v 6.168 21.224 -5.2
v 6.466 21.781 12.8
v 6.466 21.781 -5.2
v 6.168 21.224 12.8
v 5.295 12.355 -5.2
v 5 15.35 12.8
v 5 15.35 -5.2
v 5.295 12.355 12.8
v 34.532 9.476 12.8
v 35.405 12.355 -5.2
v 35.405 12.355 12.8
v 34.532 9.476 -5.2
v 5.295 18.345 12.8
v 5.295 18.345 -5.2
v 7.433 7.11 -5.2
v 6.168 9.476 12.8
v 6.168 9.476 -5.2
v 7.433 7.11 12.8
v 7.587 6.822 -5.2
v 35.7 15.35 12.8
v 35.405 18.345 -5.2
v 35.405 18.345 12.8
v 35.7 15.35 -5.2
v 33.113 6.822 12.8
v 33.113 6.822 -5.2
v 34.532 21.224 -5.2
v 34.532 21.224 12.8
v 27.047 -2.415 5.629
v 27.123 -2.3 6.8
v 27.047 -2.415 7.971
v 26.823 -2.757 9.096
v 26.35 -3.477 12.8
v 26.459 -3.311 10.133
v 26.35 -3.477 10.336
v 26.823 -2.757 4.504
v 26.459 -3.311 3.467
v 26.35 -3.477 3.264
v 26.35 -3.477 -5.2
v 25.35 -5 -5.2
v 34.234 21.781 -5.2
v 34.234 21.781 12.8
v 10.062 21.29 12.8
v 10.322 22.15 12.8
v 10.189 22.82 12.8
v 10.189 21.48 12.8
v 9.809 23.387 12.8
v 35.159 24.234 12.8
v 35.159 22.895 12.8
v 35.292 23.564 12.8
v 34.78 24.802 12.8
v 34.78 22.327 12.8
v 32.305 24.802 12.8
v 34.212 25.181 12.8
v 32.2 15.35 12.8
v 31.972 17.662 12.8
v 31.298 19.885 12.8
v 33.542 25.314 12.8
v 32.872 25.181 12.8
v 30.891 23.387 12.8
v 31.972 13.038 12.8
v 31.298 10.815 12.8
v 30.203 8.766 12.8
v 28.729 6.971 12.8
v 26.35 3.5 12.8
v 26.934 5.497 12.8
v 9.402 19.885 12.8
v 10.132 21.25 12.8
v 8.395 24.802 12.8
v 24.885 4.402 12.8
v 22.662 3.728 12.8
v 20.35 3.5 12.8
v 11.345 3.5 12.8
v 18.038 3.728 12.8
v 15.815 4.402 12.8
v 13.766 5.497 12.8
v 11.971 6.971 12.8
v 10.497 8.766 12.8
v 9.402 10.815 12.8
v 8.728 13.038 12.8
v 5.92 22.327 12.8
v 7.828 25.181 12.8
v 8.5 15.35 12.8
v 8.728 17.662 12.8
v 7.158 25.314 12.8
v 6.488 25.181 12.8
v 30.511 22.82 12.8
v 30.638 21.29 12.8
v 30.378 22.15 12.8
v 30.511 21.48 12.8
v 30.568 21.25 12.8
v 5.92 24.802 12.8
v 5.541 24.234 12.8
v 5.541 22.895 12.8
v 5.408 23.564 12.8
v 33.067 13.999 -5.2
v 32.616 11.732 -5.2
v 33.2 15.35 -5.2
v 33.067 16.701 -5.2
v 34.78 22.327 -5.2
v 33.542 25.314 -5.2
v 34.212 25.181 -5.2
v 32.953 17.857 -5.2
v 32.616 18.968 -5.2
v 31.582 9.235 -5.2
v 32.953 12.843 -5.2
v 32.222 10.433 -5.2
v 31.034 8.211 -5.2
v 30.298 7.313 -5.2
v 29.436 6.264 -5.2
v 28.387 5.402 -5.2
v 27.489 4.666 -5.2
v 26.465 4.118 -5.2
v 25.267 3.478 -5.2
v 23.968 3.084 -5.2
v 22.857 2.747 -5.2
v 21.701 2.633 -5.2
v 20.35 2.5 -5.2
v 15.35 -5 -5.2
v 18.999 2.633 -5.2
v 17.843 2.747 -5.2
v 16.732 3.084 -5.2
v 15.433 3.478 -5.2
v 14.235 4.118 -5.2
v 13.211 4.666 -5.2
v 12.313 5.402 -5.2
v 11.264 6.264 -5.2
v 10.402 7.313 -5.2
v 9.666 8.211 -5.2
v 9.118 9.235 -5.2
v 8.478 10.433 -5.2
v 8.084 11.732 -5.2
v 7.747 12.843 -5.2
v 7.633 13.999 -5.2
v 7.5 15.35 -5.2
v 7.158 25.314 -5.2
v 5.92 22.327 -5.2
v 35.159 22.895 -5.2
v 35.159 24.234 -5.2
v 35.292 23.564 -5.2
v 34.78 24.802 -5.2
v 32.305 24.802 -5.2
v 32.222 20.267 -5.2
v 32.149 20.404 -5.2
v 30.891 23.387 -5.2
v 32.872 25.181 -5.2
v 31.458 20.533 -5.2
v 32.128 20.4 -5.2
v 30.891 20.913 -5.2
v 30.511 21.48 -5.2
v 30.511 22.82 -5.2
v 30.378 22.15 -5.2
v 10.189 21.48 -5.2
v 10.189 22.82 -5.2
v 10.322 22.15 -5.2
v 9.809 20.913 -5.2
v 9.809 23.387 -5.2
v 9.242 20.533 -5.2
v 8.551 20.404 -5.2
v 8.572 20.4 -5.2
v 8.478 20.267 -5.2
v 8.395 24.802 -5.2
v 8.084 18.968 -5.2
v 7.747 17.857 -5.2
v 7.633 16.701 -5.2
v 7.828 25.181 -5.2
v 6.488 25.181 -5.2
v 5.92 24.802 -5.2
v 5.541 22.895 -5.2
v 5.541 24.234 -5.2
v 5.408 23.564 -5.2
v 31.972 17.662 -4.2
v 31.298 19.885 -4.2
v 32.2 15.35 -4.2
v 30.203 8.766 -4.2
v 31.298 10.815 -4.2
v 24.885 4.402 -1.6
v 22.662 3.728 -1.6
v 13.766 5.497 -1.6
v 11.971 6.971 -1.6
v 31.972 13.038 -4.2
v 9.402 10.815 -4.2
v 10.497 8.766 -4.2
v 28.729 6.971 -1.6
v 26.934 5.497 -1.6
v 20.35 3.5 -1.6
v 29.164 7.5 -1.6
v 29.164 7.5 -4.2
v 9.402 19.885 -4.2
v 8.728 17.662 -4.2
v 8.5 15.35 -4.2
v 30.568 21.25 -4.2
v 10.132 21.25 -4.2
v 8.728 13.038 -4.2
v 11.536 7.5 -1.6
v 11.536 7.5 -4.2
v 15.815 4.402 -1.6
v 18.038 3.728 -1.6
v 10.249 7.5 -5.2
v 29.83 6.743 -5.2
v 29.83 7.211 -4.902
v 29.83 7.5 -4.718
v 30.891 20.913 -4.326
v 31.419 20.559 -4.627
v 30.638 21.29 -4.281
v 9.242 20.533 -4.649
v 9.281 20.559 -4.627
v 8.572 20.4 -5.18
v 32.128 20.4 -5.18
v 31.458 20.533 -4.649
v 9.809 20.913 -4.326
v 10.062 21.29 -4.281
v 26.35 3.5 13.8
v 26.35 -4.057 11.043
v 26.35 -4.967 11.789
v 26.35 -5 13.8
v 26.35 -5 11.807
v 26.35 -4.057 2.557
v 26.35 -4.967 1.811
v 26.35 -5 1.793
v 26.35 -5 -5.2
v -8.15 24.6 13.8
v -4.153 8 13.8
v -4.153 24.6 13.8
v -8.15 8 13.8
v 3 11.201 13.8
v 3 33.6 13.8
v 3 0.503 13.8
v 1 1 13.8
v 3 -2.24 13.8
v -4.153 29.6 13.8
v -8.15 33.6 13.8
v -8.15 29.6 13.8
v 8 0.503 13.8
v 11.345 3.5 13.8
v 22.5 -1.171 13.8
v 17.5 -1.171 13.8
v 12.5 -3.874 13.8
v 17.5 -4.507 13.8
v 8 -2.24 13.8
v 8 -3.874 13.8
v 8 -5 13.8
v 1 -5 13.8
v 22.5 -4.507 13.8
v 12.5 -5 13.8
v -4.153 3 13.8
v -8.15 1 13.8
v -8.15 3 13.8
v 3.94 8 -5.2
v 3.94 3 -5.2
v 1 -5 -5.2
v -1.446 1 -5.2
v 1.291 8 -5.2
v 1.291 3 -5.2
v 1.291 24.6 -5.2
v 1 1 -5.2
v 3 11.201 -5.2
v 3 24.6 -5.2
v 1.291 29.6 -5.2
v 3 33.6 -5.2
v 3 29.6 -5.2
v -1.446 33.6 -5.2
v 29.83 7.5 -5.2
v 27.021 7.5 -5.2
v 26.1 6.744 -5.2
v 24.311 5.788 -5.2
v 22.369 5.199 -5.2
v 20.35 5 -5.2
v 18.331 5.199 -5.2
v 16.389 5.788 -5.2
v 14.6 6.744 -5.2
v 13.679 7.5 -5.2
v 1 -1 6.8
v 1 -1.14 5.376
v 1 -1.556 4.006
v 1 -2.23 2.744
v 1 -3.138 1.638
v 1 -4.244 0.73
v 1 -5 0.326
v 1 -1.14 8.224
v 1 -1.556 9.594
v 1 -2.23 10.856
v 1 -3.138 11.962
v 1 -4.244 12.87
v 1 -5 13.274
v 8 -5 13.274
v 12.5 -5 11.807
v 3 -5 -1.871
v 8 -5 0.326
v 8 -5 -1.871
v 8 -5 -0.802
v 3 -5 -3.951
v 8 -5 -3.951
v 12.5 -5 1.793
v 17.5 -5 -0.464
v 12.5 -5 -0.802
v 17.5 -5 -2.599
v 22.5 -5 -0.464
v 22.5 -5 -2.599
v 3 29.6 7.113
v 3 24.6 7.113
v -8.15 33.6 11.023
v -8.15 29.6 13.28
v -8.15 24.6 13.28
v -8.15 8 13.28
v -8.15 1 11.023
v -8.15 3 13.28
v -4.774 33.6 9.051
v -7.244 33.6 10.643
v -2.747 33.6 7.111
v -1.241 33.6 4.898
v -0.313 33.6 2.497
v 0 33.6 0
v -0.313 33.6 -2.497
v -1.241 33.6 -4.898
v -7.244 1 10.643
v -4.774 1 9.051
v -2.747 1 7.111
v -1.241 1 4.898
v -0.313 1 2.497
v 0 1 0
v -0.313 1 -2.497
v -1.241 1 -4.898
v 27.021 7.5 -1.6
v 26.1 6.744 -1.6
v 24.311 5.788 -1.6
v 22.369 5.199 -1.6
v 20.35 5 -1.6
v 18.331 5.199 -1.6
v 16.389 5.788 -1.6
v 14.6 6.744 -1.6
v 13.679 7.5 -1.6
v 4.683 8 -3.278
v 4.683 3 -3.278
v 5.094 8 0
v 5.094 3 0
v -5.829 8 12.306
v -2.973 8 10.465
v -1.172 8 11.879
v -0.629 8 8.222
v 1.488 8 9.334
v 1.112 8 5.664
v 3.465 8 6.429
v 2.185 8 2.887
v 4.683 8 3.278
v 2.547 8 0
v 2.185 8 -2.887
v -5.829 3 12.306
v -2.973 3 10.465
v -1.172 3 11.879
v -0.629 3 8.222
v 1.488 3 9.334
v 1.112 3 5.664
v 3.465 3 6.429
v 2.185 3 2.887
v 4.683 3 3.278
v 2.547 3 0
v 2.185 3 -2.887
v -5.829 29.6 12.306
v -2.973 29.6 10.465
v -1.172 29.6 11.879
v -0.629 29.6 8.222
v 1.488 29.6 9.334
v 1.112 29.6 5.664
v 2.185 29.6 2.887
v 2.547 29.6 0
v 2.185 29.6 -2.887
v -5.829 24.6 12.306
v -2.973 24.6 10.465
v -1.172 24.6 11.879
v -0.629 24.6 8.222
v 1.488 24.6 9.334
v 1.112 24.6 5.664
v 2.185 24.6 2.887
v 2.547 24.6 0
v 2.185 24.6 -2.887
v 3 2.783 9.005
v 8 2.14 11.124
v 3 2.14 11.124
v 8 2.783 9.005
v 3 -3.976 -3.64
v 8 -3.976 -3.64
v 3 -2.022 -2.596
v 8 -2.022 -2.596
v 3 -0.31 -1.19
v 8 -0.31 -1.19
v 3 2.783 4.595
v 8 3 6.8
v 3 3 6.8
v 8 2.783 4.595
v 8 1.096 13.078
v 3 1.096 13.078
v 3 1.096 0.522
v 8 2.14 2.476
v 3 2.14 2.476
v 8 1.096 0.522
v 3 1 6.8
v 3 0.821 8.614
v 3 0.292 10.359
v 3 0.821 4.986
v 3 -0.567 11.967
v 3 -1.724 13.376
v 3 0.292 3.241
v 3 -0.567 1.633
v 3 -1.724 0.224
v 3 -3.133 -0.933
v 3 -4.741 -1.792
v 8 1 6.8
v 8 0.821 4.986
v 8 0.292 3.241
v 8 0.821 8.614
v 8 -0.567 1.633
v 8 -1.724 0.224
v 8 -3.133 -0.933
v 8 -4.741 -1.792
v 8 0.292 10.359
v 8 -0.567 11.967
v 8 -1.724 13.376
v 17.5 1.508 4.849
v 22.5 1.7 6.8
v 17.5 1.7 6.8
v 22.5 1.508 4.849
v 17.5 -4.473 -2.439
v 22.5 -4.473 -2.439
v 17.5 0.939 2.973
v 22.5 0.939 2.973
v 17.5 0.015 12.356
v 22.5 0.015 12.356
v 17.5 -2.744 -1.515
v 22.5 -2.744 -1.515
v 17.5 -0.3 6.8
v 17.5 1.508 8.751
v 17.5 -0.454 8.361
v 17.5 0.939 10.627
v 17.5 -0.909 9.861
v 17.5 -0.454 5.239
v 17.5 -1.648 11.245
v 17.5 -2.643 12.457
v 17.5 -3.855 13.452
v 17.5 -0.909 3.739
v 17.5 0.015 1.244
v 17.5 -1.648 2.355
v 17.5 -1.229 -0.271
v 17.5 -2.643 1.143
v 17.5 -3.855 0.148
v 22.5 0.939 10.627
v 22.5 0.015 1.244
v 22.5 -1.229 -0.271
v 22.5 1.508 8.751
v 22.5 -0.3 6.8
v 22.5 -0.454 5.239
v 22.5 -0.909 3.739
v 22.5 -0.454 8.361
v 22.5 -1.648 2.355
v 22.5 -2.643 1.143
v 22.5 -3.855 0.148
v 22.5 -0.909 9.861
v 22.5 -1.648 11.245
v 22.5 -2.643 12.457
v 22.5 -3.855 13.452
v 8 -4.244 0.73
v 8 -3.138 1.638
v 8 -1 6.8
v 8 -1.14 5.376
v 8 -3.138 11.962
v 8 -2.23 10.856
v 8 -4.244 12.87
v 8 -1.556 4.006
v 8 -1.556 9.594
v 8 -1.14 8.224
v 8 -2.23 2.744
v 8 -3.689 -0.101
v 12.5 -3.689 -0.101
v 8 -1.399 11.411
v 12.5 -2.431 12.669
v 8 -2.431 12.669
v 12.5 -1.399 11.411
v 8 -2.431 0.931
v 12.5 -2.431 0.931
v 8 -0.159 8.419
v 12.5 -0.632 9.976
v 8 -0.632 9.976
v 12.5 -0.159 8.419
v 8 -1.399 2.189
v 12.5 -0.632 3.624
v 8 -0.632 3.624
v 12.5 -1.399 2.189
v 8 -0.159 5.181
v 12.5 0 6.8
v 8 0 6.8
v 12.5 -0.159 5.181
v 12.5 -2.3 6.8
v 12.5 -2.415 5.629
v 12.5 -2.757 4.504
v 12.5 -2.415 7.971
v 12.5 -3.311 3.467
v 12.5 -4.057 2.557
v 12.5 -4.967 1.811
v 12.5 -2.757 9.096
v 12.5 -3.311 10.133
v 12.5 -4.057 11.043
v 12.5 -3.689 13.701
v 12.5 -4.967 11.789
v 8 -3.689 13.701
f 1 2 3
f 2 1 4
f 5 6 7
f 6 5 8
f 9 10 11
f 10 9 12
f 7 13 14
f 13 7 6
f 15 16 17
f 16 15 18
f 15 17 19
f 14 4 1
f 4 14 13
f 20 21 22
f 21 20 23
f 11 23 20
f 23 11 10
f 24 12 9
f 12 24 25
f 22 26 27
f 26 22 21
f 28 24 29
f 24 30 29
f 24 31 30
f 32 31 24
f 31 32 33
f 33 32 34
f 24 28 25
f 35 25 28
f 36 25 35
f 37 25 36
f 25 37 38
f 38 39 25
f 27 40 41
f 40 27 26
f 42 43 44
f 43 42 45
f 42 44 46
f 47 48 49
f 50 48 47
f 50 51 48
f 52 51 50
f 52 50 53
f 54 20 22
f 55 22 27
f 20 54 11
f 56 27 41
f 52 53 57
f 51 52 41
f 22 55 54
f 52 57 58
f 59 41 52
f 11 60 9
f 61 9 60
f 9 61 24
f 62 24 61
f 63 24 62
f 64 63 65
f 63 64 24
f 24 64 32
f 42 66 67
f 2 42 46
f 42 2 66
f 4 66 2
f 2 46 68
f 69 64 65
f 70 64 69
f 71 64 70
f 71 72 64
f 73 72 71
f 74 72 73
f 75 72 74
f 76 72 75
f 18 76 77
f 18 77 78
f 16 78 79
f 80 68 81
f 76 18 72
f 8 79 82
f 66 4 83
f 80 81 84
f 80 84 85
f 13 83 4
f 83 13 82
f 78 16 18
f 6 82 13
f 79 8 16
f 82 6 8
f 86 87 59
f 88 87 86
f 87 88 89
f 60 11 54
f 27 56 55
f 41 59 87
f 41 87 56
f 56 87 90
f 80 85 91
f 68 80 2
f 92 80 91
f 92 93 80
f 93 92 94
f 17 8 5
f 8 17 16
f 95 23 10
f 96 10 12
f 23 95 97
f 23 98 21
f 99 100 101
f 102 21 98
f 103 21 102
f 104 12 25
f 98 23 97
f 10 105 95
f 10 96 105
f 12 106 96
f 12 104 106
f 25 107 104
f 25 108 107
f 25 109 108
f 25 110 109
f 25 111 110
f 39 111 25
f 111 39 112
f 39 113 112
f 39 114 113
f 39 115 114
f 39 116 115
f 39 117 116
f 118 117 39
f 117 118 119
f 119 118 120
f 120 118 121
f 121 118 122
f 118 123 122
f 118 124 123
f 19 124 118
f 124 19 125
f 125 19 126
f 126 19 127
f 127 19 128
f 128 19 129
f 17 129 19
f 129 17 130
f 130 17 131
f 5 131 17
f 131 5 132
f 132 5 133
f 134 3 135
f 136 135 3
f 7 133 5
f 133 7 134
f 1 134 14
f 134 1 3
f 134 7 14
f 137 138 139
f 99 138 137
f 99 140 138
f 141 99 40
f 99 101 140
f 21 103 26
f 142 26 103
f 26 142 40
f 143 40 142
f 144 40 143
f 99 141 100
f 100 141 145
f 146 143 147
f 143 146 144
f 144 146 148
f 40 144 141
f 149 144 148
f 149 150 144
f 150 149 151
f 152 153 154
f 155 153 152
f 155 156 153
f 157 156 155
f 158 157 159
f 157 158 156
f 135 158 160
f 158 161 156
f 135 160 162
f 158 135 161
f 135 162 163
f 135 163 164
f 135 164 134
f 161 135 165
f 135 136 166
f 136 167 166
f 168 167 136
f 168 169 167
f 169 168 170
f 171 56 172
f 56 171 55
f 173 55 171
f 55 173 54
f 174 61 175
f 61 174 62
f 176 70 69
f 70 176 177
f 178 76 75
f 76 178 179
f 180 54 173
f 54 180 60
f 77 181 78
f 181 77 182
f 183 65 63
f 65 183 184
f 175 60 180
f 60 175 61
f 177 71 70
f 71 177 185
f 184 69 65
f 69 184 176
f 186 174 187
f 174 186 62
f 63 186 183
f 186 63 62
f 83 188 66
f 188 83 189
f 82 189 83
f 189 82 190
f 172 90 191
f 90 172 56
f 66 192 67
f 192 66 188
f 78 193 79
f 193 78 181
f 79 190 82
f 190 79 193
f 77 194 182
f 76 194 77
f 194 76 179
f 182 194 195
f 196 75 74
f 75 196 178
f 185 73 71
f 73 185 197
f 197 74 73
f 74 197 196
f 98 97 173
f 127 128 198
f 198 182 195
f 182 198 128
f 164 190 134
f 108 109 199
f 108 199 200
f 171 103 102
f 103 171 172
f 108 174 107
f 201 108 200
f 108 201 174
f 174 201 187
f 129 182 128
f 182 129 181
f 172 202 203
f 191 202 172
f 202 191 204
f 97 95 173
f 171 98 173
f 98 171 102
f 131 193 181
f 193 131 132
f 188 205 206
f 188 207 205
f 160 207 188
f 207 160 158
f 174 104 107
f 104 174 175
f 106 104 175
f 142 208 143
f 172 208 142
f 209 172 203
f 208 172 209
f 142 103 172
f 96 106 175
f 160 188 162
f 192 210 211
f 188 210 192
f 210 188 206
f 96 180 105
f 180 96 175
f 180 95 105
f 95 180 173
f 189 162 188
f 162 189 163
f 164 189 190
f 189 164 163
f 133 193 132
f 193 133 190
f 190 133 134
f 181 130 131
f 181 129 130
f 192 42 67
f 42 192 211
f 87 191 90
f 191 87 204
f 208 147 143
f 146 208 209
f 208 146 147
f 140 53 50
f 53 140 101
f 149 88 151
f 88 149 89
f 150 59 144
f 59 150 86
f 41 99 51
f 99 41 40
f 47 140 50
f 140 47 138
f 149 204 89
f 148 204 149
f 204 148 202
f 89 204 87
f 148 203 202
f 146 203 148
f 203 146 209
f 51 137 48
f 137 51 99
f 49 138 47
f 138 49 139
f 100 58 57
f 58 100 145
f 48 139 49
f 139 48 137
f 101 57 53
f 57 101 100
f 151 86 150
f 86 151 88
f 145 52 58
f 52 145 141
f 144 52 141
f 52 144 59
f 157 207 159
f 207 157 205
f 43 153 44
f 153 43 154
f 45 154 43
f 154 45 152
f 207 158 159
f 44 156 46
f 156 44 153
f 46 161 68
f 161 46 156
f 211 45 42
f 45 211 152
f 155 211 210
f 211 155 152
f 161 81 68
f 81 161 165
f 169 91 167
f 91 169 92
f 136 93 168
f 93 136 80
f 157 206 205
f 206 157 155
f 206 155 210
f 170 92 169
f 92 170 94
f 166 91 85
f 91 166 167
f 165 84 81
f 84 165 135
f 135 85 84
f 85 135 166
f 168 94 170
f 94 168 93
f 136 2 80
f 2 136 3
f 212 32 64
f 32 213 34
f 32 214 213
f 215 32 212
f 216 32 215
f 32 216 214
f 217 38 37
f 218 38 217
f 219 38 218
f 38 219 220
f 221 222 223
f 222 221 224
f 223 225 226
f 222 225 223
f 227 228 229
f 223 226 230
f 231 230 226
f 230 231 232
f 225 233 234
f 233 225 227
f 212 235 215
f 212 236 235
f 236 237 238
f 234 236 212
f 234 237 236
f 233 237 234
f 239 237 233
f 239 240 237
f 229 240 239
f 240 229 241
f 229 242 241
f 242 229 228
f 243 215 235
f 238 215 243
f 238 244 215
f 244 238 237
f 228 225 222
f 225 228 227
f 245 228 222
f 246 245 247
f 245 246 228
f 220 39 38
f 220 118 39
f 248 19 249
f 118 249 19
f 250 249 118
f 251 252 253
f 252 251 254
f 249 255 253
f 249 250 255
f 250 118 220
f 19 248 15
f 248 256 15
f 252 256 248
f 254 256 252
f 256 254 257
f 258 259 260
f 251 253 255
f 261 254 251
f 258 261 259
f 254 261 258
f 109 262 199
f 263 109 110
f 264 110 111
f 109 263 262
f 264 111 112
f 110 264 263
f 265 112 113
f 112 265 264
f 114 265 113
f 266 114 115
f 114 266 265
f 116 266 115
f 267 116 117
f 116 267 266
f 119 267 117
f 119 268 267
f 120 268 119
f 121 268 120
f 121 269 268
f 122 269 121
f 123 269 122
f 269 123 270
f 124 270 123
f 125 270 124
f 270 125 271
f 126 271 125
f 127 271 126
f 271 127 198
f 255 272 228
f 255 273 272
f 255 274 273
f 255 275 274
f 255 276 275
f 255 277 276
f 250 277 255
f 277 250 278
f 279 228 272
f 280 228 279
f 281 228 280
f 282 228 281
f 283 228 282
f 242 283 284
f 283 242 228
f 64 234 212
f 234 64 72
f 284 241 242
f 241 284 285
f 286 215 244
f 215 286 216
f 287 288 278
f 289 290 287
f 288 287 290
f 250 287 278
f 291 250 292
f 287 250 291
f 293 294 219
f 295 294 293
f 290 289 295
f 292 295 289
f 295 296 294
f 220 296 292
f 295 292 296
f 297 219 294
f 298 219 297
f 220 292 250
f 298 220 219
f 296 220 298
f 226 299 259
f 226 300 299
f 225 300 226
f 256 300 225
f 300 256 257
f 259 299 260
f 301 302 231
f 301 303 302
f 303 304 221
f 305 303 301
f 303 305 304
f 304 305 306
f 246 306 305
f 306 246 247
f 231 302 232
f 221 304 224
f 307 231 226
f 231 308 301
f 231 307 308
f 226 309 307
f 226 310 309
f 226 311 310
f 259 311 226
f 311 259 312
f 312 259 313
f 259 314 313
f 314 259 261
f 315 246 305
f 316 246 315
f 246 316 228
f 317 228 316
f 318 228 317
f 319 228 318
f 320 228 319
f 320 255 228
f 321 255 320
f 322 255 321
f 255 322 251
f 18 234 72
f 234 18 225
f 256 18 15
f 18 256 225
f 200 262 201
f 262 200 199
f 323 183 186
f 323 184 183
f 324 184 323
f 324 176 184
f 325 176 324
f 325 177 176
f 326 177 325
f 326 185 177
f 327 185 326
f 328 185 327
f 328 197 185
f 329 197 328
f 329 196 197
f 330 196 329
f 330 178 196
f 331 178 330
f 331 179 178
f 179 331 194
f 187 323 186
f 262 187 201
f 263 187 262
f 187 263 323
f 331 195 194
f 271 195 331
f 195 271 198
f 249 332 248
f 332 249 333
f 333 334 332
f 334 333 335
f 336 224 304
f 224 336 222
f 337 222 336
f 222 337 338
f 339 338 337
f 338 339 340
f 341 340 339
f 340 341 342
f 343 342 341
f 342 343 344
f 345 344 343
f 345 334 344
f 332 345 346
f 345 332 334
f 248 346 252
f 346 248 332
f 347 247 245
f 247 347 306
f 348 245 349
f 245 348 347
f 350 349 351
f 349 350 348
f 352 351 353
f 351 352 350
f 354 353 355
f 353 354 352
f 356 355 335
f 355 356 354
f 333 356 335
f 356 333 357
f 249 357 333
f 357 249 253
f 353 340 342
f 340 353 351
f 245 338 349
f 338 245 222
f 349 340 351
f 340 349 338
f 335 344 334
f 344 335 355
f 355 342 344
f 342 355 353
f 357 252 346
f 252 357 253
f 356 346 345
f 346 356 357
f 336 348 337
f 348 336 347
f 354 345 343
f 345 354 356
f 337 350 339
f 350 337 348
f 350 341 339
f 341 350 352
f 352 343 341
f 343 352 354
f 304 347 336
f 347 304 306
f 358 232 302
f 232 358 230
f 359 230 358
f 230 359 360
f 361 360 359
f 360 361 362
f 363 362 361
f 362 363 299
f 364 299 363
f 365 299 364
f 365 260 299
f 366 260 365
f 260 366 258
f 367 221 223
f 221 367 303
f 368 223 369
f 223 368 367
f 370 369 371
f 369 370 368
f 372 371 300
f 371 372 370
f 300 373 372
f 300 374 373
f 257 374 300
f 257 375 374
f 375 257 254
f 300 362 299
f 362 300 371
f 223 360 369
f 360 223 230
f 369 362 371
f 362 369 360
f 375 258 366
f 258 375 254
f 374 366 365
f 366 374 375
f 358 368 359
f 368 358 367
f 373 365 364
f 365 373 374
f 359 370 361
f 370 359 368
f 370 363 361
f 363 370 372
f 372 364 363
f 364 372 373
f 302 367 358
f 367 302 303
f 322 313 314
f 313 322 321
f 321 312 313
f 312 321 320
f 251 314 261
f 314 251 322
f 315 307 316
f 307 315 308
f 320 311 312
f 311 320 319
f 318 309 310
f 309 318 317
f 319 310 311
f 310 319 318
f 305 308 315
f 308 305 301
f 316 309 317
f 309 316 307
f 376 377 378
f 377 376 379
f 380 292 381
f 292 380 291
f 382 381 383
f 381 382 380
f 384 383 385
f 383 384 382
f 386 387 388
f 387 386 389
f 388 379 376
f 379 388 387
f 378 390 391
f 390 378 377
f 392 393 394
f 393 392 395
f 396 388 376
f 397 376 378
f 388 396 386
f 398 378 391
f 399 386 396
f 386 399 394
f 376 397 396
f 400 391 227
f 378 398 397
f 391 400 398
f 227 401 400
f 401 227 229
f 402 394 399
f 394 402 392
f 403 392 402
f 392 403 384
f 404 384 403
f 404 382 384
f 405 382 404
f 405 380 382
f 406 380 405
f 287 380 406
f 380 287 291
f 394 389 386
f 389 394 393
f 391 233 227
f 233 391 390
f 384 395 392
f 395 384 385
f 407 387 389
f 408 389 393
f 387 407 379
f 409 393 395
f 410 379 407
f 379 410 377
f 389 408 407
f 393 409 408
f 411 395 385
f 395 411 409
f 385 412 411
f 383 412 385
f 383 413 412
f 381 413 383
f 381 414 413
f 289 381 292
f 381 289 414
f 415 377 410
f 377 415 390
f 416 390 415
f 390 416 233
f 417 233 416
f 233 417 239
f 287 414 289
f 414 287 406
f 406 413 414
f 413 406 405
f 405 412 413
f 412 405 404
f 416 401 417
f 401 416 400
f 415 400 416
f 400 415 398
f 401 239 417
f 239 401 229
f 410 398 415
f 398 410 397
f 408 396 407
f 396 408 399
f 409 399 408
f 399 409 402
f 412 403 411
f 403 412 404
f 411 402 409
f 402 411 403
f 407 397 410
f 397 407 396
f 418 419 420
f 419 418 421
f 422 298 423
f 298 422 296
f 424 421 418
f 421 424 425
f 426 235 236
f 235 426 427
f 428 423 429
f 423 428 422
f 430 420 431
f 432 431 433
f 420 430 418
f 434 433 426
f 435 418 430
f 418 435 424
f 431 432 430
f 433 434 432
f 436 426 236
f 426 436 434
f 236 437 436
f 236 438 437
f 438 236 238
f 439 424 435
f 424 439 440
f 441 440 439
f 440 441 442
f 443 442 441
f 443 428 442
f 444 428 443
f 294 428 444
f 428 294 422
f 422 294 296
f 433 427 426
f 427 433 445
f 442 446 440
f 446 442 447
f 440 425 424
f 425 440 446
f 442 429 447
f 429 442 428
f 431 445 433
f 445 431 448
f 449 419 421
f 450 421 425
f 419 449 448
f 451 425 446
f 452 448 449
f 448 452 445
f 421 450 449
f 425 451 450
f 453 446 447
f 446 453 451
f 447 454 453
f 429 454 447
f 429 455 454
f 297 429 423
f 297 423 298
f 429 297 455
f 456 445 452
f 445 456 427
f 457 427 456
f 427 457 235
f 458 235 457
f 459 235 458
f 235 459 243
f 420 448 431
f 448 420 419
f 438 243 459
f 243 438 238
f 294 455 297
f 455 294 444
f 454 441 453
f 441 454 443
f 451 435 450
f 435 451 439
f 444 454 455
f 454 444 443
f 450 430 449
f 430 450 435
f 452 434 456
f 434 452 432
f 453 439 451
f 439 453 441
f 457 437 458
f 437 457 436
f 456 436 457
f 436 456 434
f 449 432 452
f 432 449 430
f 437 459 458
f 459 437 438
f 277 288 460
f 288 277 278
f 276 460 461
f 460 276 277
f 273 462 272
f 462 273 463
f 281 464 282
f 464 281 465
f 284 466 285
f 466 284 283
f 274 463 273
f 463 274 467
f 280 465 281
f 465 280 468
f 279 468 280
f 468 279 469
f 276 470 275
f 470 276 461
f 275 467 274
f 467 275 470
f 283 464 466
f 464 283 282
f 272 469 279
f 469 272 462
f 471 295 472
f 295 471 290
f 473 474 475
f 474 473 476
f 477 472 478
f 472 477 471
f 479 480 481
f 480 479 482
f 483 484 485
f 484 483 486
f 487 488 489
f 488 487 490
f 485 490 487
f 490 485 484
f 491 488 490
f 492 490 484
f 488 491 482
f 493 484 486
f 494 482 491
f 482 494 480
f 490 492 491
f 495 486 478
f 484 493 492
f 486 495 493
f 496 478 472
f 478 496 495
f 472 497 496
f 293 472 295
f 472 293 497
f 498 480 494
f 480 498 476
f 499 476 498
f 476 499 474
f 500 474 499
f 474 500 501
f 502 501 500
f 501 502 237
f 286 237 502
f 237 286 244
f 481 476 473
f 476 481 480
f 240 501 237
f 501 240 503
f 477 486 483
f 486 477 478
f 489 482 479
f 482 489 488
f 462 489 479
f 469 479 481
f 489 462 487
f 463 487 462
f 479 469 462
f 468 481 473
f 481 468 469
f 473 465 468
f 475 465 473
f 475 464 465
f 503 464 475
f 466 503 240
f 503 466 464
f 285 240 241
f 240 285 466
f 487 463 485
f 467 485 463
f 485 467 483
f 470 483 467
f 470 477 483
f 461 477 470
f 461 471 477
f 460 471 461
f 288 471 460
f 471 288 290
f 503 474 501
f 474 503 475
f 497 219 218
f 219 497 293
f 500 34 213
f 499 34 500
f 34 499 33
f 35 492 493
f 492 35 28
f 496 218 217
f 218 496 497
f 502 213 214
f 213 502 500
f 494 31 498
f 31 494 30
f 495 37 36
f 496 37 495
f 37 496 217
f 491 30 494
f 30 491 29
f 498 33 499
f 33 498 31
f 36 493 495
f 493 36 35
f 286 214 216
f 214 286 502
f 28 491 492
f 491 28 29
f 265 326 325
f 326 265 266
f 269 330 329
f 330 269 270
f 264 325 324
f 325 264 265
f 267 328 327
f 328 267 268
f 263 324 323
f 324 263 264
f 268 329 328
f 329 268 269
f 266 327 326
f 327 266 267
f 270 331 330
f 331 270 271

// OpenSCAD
// file: ../standard_optomechanics/cylinder_clamp.scad
use <../utilities.scad>;
d=0.05;

//for 1 inch/25mm post clamp, an inner radius of 12.8 is good.
	
module cylinder_clamp(
	inner_r=12.8, //radius of the cylinder being clamped (ish!)
	clamp_h=11, //thicknedess of the clamp along the cylinder axis
	clamp_t=4, //thickness of the clamp radially
	flat_t=8, //how thick the bottom of the clamp is (often need to allow for the mounting bolt head here)
	flat_width=15, //width of the flat base
	mounting_bolt=4, //nominal size of mounting bolt (default is 4 for M4, 0 to disable)
	nut_trap=false,
	bevel_top=0.5, //size of 45 degree bevel on top surface
	bevel_bottom=0.8 //size of 45 degree bevel on bottom of hole
	){
	assign(
		post_r = inner_r, //poor initial choice of name!
		bolt_flat_w=10, //width of the region where the bolt is
		gap_w=3 //size of the gap that is squeezed by the bolt
	)
	difference(){
		hull(){
			cylinder(h=clamp_h,r=post_r+clamp_t,center=true,$fn=48);
			translate([0,-post_r-flat_t/2,0]) cube([flat_width,flat_t,clamp_h],center=true);
			translate([0,post_r+bolt_flat_w/2,0]) cube([12,bolt_flat_w,clamp_h],center=true);
		}
	
		cylinder(h=9999,r=post_r,center=true,$fn=48); //cylinder being clamped
		//bevels, top and bottom
		translate([0,0,-clamp_h/2]) cylinder(r1=post_r+3*bevel_bottom,r2=post_r-bevel_bottom,h=4*bevel_bottom,center=true);
		translate([0,0,clamp_h/2]) cylinder(r2=post_r+3*bevel_top,r1=post_r-bevel_top,h=4*bevel_top,center=true);
		//gap (squeezed by bolt)
		translate([0,999,0]) cube([gap_w,999*2,999],center=true); //gap
	
		//clamping bolt
		translate([gap_w/2+2,post_r+bolt_flat_w/2,0]) rotate([0,0,-90]) nut_y(4,h=999,shaft=true);
		translate([-gap_w/2-2,post_r+bolt_flat_w/2,0]) rotate([0,0,90]) cylinder_with_45deg_top(r=4,h=999,$fn=16); //counterbore for nut head
	
		if(mounting_bolt > 0){
			//mounting bolt
			translate([0,-post_r-4.5,0]) rotate([-90,0,0]){
				intersection(){
					rotate([90,0,0])
						if(nut_trap){
							nut_y(mounting_bolt,fudge=1.15,shaft=true,h=999);
						}else{
							screw_y(mounting_bolt,fudge=1.07,shaft=true,h=999);
						}
					cube([inner_r*2,inner_r*2,clamp_h*2],center=true);
				}
			}
		}
		//in the case of thick clamps with thin flats, this keeps the bottom flat
		translate([0,-inner_r-flat_t-999,0]) cube([9999,999*2,9999],center=true);
	}
}

module cylinder_clamp_v(
	inner_r=12.8, //radius of the cylinder being clamped (ish!)
	clamp_h=10, //width of the clamp along the cylinder (y) axis
	clamp_t=4, //thickness of the clamp radially
	flat_t=8, //how thick the bottom of the clamp is (often need to allow for the mounting bolt head here)
	flat_width=15, //width of the flat base
	mounting_bolt=4, //nominal size of mounting bolt (default is 4 for M4, 0 to disable)
	bevel=0.5 //put a 45 degree bevel on the edges of the hole
	){
	assign(
		post_r = inner_r, //poor initial choice of name!
		bolt_flat_w=11, //width of the region where the bolt is
		gap_w=2*inner_r*sin(45/2),//sin(acos(1-(9/2-4/2*1.22)/inner_r))*inner_r //size of the gap that is squeezed by the bolt
		bolt_z = inner_r+4/2*1.22+d //position of bolt (so bolt just clears the cylinder we're clamping
	)assign( //the second assign statement allows us to use gap_w
		bolt_span=gap_w+4+d//max(2*inner_r*sin(acos(1-(9/2-4/2*1.22)/inner_r)), gap_w+4)
	)
	difference(){
		hull(){
			rotate([90,0,0]) cylinder(h=clamp_h,r=inner_r+clamp_t,center=true,$fn=48);
			translate([0,0,-inner_r-flat_t/2]) cube([flat_width,clamp_h,flat_t],center=true);
			translate([0,0,bolt_z]) cube([gap_w+9,clamp_h,bolt_flat_w],center=true);
		}
	
		cylinder_with_45deg_top(h=9999,r=post_r,center=true,$fn=48); //cylinder being clamped
		reflect([0,1,0]) translate([0,clamp_h/2,0]) rotate([90,0,0]) cylinder(r1=post_r+3*bevel,r2=post_r-bevel,h=4*bevel,center=true); //bevel
		translate([0,0,999]) cube([gap_w,999,999*2],center=true); //gap
	
		//clamping bolt
		translate([bolt_span/2,0,bolt_z]) rotate([0,0,-90]) nut_y(4,h=999,shaft=true);
		translate([-bolt_span/2,0,bolt_z]) rotate([0,0,90]) cylinder_with_45deg_top(r=4,h=999,$fn=16); //counterbore for nut head
	
		if(mounting_bolt > 0){
			//mounting bolt
			translate([0,0,-post_r-4.5]){
				cylinder(r=mounting_bolt*1.1,h=post_r,$fn=16);
				cylinder(r=mounting_bolt/2*1.22,h=flat_t*2,center=true,$fn=16);
			}
		}
		translate([0,0,-inner_r-flat_t-999]) cube([9999,9999,999*2],center=true);
	}
}

translate([0,30,0]) cylinder_clamp_v(30.5/2, 10, flat_width=24, mounting_bolt=4, flat_t=8);

cylinder_clamp(30.5/2, flat_width=24, mounting_bolt=4, flat_t=8,nut_trap=true);
// file: cylinder_clip.scad
use <../utilities.scad>;

module cylinder_clip(r=1,t=3,opening_angle=120,wing_length=2,wing_angle=45,flat_w=10,flat_t=3,h=10,$fn=$fn){
	union(){
		difference(){
			hull(){
				cylinder(r=r+t,$fn=$fn,h=h);
				translate([-flat_w/2,-r-flat_t,0]) cube([flat_w,0.1,h]);
			}
			cylinder(r=r,$fn=$fn,h=99999,center=true);
			cylinder(r1=r+2,r2=r,$fn=$fn,h=2,center=true);
			scale([tan(opening_angle/2),1,1]) rotate([0,0,45]) translate([0,0,-1]) cube([1,1,1]*9999);
		}
		reflect([1,0,0]) translate([sin(opening_angle/2),cos(opening_angle/2),0]*(r+t/2)) hull() repeat([sin(wing_angle),cos(wing_angle),0]*wing_length,2)
			cylinder(r=t/2,h=h,$fn=16);
			
	}
}

//cylinder_clip(r=3,t=2,flat_w=6);
union(){
	cylinder_clip(r=21,t=4.5,flat_t=10,opening_angle=100,$fn=64);
	translate([-5,-22-5-20,0]) cube([10,20,10]);
}
// main file
use <../utilities.scad>;
use <./cylinder_clip.scad>;
use <../standard_optomechanics/cylinder_clamp.scad>;

socket_radius = 24.3/2-0.3;
clip_t = 3.5;
vbrake_mount_r2 = 11.6/2+0.2;
vbrake_mount_r1 = 14/2+0.3;
corner_clearance = 1;
vbrake_mount_l1 = 8;
vbrake_mount_l2 = 20;
vbrake_mount_lip_l = 4.5;
clip_h = 18;
fork = [32.6,25.6];
base_z = fork[1]/2-clip_h; //in original this was -fork[1]/2+1
mount_h = fork[1]/2+1 - base_z;
reinforcement = [13,12];
$fn=32;
d=0.05;

module annulus(inner_r,thickness,h){
	difference(){
		cylinder(r=inner_r+thickness,h=h);
		cylinder(r=inner_r,h=99999,center=true);
	}
}
module cable_tie(inner_r){
	annulus(inner_r+2,2,5);
}

difference(){
	union(){
		translate([socket_radius+clip_t+5,socket_radius+clip_t,base_z]) cylinder_clip(r=socket_radius, t=clip_t,flat_w=10,flat_t=clip_t+5,h=clip_h);
		translate([corner_clearance,-5,base_z]) cube([socket_radius+clip_t+10,5+clip_t,mount_h]); //attachment to V brake mount
		translate([-fork[0]/4,corner_clearance,base_z]) cube([fork[0]/4+3,fork[0],mount_h]); //attachment to fork
		translate([corner_clearance,corner_clearance,base_z]) hull(){
			cube([reinforcement[0],d,mount_h]);
			cube([d,reinforcement[1],mount_h]);
		}
		translate([clip_t+5,clip_t,base_z]) cube([socket_radius*1.8,4,3.6]);
	}

	// Pedal mount
	translate([socket_radius+clip_t+5,socket_radius+clip_t,0]) cylinder(r=socket_radius-1.5,h=999,center=true);

	//////////// Fork
	translate([-fork[0]/2,0,0]) rotate([-90,0,0]) scale([fork[0]/fork[1],1,1]){
		cylinder(r=fork[1]/2,h=999,center=true);
		translate([0,0,3]) cable_tie(fork[1]/2);
		translate([0,0,fork[0]-8]) cable_tie(fork[1]/2);
	}

	//////////// V brake mount
	translate([0,-vbrake_mount_r1-1,fork[1]/2-vbrake_mount_r2]) rotate([0,90,0]){
		cylinder(r=vbrake_mount_r1,h=vbrake_mount_l1+d);
		translate([0,0,vbrake_mount_l1]) cylinder(r=vbrake_mount_r1+1,h=vbrake_mount_lip_l);
		translate([0,0,vbrake_mount_l1+vbrake_mount_lip_l]) cylinder(r=vbrake_mount_r2,h=vbrake_mount_l2);
		// Cable tie points
		translate([0,0,vbrake_mount_l1-5]) cable_tie(vbrake_mount_r1);
		translate([0,0,vbrake_mount_l1+vbrake_mount_lip_l+5]) cable_tie(vbrake_mount_r2);
	}
}
